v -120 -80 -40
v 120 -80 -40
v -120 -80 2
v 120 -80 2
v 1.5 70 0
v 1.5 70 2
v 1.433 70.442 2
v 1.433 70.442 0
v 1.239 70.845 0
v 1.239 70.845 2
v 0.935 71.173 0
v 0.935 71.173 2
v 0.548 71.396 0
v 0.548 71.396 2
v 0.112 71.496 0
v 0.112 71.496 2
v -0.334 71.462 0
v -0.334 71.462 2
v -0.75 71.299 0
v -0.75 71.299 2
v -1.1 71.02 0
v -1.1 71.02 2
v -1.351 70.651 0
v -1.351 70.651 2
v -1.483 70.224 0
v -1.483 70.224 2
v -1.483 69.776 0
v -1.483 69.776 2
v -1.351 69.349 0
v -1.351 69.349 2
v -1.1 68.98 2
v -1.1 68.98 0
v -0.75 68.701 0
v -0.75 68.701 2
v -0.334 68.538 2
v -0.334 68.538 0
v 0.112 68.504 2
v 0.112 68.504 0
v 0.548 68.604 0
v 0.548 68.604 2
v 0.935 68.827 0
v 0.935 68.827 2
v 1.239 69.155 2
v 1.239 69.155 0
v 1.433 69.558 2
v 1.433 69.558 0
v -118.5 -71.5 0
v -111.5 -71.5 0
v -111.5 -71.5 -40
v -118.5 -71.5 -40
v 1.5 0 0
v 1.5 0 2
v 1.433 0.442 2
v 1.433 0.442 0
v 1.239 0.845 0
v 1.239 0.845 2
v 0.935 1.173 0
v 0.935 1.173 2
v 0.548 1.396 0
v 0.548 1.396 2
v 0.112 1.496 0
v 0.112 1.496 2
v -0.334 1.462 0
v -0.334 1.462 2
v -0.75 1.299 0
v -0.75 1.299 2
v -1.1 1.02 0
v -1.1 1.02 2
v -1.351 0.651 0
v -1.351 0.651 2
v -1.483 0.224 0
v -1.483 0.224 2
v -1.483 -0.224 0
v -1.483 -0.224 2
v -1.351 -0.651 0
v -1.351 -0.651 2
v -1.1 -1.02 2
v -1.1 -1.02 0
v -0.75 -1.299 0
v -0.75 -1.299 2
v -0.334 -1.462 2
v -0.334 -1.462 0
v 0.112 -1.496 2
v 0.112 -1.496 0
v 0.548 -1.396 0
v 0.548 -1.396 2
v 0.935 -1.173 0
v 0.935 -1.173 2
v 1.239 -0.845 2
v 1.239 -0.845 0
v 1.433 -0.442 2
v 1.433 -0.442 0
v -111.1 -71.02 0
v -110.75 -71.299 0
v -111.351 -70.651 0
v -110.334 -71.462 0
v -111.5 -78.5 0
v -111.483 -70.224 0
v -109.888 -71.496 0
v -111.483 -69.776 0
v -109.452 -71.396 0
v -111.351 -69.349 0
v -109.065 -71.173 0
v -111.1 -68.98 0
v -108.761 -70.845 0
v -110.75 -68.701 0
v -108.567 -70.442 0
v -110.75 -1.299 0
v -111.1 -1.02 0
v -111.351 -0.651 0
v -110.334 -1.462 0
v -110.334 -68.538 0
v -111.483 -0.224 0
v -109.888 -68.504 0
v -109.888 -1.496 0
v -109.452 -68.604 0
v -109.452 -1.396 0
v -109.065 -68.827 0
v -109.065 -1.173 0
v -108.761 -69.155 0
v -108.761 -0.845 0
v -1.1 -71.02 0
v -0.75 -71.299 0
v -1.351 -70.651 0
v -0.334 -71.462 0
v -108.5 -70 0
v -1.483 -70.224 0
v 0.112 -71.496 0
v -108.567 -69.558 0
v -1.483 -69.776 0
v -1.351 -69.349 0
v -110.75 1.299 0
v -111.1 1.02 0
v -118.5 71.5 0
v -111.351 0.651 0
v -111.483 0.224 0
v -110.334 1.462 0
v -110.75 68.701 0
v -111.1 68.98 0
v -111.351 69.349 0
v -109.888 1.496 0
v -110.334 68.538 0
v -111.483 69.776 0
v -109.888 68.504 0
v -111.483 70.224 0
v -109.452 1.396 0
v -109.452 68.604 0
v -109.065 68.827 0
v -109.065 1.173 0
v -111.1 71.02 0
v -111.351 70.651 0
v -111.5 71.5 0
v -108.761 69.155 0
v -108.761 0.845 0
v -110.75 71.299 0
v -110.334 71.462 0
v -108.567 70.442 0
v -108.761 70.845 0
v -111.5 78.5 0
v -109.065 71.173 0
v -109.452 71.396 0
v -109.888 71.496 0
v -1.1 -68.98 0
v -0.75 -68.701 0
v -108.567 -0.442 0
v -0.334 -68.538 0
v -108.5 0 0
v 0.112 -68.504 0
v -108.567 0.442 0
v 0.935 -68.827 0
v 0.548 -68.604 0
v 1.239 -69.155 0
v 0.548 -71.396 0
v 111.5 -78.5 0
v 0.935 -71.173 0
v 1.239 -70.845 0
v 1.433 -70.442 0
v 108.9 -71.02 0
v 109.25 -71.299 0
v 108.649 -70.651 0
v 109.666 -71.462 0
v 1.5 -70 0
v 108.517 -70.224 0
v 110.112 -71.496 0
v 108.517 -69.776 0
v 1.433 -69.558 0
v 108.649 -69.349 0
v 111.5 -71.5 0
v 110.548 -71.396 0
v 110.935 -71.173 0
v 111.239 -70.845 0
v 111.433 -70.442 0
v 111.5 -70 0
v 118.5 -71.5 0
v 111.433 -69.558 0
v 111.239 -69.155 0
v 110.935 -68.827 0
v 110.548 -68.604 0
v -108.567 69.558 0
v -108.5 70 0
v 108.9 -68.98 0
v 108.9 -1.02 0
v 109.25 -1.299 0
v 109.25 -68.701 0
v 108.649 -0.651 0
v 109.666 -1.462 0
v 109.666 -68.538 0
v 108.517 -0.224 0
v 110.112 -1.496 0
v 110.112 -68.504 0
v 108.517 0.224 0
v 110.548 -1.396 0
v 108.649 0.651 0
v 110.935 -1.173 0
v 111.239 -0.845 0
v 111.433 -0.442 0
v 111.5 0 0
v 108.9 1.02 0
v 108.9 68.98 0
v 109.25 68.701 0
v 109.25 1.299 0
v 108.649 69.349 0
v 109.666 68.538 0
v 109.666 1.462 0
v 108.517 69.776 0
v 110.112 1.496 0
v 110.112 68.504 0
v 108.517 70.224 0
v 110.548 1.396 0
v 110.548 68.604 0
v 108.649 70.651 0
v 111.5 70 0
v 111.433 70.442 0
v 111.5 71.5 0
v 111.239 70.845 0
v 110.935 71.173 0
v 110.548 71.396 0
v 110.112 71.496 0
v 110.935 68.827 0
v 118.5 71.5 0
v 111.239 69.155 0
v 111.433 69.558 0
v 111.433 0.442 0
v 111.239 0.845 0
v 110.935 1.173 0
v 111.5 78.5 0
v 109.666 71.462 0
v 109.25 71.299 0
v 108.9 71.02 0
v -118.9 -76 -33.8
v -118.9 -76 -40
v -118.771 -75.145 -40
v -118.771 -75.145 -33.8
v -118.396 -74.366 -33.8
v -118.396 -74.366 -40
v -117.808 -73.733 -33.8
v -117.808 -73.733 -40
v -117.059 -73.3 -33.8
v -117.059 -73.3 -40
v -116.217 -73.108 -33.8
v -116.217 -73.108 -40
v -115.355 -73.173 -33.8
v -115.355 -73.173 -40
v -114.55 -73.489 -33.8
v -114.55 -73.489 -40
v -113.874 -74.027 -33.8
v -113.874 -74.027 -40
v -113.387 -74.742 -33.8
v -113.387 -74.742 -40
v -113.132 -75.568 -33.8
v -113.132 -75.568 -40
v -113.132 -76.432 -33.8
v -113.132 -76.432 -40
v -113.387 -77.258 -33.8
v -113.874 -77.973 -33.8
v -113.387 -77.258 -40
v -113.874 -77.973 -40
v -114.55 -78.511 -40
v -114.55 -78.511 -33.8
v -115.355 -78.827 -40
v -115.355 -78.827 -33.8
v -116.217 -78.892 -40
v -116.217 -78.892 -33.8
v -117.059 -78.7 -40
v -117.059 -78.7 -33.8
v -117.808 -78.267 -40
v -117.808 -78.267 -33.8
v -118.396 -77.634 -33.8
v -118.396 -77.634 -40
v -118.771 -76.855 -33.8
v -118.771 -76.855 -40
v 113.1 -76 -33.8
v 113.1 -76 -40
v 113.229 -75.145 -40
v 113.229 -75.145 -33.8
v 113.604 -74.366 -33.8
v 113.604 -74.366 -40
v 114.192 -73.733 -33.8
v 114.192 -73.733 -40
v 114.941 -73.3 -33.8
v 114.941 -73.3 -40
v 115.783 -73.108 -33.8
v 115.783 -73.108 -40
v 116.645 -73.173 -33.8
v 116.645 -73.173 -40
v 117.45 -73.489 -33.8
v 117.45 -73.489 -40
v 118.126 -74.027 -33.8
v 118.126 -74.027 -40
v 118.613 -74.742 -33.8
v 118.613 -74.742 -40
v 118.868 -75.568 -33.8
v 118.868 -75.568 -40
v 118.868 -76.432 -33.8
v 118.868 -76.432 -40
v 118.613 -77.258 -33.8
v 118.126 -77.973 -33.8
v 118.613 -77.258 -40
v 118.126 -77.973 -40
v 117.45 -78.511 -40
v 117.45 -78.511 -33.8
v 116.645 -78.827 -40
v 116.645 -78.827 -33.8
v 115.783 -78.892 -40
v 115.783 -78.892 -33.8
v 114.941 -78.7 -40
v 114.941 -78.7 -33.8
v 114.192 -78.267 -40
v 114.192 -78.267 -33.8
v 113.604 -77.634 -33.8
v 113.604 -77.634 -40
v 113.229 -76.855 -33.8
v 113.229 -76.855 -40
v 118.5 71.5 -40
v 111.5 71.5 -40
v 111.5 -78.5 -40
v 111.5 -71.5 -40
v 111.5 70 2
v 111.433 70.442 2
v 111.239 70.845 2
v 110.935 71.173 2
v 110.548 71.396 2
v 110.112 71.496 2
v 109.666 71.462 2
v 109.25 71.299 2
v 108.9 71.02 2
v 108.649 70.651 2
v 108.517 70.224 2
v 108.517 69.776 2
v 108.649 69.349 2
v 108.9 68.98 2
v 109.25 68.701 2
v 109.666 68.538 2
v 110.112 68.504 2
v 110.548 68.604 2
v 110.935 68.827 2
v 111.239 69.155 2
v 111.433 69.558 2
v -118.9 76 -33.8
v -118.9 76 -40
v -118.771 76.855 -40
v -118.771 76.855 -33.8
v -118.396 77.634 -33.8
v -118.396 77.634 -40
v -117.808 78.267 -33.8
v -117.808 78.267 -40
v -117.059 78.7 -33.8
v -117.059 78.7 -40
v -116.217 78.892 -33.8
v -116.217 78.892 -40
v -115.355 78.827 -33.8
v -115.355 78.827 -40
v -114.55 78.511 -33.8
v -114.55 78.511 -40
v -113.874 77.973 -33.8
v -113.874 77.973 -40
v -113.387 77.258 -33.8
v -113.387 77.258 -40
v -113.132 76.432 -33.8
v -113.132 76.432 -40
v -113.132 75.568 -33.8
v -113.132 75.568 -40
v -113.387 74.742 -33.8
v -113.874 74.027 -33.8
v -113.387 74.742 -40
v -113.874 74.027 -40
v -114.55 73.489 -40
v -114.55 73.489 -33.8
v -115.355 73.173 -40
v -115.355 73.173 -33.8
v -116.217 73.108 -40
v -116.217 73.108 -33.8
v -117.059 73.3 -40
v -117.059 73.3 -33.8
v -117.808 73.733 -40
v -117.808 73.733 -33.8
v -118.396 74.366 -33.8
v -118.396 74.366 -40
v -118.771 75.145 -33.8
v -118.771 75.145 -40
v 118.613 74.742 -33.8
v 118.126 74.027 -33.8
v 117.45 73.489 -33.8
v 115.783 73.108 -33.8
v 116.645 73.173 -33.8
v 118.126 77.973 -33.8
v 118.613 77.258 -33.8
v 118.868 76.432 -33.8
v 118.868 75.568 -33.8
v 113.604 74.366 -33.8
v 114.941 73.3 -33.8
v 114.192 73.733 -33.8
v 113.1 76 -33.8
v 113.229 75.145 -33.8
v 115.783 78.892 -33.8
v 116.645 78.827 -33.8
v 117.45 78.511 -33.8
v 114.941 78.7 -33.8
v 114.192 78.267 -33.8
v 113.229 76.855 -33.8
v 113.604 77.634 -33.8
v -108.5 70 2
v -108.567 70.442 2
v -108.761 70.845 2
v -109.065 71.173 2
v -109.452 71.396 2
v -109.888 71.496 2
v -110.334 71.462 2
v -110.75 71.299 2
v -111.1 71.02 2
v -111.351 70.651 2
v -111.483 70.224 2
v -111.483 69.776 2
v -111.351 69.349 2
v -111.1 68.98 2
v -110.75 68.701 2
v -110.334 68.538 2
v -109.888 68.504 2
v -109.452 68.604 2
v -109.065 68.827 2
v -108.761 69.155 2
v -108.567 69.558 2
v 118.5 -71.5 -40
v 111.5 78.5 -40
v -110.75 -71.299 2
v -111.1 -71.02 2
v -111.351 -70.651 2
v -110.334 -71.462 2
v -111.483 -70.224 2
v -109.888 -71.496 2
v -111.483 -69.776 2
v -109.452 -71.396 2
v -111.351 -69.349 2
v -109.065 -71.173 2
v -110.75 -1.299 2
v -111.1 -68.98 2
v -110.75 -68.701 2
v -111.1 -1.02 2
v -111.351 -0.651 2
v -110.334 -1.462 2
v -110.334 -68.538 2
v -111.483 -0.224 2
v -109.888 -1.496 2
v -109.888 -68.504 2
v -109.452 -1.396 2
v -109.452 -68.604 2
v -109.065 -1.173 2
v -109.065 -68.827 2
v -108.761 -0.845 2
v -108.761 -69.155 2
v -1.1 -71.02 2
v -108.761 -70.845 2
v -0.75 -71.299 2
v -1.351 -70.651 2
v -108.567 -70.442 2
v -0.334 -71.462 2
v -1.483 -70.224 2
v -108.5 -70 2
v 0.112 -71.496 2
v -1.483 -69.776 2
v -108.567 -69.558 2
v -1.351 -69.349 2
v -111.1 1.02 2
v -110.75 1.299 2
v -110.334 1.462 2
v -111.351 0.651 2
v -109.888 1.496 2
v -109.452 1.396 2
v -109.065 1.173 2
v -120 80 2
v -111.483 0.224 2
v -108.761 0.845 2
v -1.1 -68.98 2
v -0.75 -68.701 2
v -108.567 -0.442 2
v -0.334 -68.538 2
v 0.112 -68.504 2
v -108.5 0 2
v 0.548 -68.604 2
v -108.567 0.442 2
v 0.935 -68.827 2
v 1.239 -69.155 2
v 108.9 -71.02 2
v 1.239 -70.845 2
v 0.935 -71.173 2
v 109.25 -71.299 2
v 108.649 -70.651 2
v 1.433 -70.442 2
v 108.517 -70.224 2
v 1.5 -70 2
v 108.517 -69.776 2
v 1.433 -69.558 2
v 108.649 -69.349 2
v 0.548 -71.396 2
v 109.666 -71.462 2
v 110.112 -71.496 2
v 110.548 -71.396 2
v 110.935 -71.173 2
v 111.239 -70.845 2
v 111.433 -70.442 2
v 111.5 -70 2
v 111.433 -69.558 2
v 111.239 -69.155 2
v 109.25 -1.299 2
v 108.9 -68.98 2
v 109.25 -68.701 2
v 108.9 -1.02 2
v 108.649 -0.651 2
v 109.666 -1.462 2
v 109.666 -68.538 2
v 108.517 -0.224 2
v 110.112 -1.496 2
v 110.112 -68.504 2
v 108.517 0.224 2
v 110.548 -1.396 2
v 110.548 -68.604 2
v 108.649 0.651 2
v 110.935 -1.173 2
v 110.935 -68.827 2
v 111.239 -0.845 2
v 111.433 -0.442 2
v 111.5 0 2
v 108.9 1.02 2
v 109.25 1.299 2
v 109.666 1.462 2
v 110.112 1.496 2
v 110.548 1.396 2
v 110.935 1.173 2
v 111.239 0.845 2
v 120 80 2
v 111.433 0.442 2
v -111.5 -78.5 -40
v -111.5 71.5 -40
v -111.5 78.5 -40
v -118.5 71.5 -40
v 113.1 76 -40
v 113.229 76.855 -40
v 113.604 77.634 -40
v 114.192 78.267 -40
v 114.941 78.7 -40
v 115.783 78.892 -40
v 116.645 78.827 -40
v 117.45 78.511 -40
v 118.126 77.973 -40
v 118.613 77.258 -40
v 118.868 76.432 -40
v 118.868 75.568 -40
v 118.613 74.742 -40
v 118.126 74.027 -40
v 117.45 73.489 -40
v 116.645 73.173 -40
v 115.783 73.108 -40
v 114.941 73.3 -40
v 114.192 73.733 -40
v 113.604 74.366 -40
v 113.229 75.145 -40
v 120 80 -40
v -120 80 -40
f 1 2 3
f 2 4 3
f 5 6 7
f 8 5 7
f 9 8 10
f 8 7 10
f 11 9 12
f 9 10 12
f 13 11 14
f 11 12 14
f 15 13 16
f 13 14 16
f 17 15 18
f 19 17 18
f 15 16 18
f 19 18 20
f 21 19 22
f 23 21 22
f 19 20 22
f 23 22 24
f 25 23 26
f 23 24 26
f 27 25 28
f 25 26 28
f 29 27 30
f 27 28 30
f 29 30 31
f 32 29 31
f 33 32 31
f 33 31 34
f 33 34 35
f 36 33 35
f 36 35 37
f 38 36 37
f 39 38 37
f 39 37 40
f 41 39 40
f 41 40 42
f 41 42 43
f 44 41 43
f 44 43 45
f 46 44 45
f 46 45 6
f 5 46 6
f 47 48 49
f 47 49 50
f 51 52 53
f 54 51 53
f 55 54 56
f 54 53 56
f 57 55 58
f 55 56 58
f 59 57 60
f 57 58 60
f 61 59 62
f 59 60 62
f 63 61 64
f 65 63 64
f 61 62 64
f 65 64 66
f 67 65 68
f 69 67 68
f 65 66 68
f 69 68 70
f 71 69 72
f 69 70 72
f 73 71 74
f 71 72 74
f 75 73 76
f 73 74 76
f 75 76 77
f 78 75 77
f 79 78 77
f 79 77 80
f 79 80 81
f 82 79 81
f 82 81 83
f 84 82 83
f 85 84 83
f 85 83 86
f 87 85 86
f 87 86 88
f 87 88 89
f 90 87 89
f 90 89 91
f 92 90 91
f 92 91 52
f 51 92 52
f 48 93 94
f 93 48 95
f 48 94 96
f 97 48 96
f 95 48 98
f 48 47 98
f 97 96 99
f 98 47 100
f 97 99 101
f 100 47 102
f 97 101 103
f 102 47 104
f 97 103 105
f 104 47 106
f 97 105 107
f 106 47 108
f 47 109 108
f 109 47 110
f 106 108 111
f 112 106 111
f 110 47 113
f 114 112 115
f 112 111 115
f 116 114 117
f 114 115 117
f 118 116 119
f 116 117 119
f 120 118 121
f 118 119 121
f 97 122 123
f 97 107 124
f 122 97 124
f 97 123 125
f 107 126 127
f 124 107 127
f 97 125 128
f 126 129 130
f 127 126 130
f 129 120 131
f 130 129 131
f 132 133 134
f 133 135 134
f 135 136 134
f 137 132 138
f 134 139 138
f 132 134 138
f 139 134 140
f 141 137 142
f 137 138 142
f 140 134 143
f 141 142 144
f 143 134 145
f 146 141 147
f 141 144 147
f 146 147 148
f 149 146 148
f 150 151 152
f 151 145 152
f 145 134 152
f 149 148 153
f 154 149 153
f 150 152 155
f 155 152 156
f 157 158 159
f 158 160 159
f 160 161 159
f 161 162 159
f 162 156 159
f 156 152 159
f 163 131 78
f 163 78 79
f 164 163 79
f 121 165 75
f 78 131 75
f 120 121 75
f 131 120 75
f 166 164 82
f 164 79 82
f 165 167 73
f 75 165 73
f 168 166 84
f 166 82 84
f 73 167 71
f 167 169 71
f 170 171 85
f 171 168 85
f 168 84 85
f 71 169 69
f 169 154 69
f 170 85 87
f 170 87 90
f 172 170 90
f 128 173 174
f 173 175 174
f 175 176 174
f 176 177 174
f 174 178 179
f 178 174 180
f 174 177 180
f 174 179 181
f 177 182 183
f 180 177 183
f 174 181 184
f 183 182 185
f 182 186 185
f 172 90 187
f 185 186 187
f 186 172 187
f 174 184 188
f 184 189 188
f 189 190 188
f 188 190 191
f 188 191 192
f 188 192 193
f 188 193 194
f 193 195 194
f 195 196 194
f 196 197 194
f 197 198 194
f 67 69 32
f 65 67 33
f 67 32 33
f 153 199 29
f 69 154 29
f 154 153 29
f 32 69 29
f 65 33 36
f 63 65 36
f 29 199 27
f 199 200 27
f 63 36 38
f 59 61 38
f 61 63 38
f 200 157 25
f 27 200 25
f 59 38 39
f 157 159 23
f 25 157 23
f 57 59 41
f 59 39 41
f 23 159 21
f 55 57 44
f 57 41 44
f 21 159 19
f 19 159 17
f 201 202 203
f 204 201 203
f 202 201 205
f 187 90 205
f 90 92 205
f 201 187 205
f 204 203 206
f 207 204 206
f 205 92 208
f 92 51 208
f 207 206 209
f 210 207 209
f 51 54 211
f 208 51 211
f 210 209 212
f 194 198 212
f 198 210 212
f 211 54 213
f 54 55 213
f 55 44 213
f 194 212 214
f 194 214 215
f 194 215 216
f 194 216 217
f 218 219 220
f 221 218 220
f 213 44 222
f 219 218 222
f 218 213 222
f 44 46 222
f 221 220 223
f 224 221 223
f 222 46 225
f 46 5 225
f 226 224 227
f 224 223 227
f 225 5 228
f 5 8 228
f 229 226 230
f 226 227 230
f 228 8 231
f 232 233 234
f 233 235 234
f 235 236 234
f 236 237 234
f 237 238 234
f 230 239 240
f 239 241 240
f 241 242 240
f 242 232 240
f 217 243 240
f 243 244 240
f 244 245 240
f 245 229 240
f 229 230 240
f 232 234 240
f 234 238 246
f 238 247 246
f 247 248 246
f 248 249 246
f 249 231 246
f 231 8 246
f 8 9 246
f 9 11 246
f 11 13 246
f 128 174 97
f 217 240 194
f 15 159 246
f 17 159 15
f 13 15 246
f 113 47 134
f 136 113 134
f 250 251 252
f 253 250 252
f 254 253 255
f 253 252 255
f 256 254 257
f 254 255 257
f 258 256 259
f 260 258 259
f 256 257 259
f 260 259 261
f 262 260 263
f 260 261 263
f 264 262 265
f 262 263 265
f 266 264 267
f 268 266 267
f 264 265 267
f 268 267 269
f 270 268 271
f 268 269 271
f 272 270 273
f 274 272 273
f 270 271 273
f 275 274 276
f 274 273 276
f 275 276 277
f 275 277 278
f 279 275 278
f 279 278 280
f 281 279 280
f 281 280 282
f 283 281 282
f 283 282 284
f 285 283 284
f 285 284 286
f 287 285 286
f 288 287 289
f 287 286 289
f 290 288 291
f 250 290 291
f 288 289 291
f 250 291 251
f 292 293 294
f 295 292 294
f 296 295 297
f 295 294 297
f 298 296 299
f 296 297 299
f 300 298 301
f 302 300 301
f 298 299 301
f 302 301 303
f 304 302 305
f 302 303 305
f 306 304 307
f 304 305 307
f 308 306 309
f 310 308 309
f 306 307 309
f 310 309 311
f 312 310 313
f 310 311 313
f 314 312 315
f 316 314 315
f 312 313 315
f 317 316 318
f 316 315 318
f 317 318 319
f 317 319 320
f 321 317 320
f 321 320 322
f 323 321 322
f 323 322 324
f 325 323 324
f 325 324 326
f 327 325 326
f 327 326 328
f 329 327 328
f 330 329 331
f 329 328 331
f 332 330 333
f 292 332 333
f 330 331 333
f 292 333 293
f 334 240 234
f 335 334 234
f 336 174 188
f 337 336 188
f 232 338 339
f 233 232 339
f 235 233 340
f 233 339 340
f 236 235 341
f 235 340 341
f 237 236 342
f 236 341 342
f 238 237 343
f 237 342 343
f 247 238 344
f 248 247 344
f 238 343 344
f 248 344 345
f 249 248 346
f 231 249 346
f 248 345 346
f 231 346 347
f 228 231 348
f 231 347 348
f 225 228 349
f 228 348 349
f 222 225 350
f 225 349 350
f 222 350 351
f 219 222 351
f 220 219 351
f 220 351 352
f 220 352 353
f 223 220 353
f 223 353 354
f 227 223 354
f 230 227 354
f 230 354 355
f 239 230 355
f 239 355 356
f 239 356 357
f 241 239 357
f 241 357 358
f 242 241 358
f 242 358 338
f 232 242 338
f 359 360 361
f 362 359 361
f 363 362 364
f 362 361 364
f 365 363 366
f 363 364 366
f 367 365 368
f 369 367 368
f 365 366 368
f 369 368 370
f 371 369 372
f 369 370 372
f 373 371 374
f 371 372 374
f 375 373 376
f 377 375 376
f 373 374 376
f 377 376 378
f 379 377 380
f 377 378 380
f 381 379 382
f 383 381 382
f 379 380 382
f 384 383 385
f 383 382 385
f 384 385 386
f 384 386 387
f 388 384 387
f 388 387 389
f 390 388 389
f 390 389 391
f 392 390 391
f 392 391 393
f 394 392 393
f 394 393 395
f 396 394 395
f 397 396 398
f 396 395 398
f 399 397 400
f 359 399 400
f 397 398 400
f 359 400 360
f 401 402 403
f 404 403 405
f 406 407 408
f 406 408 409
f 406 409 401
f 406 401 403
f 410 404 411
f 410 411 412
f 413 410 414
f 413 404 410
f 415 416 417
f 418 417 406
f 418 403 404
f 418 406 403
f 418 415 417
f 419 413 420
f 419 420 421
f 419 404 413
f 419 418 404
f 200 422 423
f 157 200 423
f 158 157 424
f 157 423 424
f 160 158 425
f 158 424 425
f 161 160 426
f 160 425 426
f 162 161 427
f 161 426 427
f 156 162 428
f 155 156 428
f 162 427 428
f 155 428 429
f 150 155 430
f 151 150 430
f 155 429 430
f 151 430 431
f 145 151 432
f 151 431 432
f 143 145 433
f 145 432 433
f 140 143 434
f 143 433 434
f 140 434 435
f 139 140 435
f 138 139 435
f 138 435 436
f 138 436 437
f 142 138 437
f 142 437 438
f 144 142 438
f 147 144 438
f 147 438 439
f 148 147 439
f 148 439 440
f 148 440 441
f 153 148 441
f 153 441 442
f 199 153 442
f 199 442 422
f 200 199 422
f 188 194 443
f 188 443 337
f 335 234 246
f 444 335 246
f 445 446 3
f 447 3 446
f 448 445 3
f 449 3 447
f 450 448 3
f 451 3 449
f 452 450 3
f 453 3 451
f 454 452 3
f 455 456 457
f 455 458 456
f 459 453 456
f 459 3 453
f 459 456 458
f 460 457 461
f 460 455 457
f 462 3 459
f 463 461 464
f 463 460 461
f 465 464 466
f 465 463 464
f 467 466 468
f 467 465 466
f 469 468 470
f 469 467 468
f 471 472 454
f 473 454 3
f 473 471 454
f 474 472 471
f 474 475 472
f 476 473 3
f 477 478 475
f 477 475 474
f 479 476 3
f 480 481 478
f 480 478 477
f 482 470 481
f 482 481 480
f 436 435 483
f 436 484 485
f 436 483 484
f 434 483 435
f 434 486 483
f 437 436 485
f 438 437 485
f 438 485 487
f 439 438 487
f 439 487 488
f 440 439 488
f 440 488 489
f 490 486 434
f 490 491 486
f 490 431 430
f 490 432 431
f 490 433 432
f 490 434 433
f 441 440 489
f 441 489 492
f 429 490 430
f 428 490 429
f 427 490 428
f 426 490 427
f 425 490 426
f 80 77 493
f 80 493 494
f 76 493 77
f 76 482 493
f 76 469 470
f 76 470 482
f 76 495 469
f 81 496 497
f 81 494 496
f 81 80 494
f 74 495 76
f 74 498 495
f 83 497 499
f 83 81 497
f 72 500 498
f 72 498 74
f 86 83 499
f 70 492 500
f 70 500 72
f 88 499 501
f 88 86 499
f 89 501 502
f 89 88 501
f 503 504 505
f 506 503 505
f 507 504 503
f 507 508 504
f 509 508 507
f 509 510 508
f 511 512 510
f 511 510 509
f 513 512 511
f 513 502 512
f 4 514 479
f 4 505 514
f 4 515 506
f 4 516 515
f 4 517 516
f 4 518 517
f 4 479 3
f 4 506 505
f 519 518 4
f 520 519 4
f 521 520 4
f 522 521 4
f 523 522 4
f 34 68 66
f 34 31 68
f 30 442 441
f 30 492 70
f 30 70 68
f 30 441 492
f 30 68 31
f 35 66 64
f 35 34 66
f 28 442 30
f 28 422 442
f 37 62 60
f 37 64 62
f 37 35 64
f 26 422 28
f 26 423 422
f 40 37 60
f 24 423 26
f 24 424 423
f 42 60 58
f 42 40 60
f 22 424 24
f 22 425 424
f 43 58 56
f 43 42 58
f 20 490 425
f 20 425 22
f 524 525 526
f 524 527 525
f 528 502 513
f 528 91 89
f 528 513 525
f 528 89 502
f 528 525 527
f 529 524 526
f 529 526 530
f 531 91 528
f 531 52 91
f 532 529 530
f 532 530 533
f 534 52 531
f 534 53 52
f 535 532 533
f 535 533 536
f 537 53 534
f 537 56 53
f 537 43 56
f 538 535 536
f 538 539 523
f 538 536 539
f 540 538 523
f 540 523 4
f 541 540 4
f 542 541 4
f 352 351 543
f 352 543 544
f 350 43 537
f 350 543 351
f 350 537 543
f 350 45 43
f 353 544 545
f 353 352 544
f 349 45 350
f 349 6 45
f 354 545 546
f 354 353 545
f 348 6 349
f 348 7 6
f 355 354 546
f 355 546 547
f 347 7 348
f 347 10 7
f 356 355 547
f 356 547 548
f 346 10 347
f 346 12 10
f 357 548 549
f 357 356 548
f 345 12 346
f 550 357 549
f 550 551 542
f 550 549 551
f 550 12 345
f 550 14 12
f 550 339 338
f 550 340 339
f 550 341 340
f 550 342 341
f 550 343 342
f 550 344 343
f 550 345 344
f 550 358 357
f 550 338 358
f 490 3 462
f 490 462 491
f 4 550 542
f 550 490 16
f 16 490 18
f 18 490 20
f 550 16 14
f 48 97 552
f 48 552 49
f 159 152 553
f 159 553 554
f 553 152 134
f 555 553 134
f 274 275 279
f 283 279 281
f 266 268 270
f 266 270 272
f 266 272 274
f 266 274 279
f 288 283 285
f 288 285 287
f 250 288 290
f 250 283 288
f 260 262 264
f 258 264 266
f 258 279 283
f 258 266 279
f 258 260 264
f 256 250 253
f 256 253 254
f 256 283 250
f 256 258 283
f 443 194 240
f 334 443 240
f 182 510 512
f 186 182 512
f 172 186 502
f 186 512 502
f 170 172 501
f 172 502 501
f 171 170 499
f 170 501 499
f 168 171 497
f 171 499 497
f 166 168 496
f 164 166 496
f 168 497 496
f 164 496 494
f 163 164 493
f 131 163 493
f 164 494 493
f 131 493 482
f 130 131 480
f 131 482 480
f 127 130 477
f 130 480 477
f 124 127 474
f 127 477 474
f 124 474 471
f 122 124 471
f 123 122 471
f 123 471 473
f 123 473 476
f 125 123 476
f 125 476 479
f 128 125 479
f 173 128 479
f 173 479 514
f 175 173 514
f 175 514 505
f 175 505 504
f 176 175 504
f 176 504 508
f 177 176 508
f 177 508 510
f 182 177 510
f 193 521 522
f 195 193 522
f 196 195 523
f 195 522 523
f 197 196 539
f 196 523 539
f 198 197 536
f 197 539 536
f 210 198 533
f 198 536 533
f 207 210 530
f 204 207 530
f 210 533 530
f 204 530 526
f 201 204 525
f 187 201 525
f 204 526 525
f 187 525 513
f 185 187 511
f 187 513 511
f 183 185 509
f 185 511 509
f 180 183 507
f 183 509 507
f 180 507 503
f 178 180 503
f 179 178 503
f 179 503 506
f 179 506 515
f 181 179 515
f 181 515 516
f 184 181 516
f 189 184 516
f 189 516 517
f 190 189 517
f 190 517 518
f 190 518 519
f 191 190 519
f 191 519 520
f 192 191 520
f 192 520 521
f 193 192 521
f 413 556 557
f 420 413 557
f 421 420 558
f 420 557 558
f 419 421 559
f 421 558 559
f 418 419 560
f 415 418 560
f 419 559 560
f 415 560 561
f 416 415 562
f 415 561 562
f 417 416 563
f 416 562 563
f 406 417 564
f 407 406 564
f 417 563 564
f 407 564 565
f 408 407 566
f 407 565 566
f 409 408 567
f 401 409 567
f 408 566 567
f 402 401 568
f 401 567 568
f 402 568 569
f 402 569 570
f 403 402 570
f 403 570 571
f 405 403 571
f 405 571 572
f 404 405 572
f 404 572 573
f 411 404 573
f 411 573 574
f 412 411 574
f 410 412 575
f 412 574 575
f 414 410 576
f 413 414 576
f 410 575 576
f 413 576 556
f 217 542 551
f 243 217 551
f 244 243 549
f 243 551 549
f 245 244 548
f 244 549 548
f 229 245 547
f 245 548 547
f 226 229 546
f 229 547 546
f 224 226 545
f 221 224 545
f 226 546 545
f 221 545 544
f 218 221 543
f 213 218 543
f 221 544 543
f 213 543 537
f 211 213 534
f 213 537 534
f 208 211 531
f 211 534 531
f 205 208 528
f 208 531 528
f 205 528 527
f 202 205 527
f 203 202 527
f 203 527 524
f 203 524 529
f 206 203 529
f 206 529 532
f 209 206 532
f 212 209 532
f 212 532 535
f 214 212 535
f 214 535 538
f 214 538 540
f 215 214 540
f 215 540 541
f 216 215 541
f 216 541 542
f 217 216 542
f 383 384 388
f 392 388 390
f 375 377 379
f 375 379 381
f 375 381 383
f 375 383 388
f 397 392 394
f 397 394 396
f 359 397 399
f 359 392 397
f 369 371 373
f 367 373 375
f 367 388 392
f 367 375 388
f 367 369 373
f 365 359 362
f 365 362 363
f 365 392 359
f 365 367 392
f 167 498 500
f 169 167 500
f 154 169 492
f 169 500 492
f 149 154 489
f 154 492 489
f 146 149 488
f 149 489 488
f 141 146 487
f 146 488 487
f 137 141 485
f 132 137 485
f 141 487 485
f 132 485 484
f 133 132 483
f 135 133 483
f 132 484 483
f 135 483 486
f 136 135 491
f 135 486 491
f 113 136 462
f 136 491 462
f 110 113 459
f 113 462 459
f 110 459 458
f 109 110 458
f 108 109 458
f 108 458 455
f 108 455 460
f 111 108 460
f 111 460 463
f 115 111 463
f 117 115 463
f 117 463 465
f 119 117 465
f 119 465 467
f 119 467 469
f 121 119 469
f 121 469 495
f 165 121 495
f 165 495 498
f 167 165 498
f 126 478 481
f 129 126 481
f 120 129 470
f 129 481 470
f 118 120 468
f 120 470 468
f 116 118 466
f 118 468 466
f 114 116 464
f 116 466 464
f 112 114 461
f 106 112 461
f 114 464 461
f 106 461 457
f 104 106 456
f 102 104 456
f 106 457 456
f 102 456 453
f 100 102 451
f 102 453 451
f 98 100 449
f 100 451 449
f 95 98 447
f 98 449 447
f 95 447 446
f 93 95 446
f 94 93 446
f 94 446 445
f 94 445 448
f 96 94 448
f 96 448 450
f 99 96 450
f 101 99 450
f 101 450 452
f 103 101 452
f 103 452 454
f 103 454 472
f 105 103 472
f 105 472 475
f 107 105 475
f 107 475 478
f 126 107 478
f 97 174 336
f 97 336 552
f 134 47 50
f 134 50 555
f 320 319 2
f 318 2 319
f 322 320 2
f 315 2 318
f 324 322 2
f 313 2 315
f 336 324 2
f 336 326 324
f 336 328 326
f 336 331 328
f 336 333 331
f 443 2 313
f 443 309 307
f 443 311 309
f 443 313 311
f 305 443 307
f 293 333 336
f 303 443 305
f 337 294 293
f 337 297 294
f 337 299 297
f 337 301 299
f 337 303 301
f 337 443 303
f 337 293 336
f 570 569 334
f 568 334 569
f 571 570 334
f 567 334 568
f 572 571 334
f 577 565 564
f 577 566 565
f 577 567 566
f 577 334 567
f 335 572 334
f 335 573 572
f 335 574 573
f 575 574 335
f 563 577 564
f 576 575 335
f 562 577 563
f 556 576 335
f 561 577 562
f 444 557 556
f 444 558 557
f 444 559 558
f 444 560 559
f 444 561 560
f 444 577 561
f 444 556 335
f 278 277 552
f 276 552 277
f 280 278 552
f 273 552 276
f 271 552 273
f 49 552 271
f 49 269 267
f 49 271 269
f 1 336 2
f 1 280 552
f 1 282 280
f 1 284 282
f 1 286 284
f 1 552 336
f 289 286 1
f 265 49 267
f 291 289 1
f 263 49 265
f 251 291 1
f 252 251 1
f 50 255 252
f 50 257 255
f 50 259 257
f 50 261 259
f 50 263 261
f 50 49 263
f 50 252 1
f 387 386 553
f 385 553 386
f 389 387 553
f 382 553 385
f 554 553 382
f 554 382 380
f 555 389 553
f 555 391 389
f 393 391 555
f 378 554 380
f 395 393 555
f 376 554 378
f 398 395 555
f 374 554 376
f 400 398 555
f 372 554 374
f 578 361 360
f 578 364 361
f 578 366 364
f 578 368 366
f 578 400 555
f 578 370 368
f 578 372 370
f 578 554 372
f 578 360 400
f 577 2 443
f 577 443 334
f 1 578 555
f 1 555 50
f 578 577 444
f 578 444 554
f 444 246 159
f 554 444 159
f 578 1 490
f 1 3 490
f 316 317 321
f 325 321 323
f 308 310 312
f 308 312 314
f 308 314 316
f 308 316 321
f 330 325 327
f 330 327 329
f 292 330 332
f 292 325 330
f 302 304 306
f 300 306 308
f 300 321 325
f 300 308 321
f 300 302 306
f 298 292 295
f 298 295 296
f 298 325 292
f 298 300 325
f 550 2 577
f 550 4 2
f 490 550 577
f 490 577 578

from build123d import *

# Parameters (mm, degrees)
SKETCH1_W           = 240
SKETCH1_H           = 160
BOSS_EXTRUDE1_DEPTH = 2
SKETCH5_R           = 1.5
CUT_EXTRUDE2_DEPTH  = 4
SKETCH6_W           = 240
SKETCH6_H           = 160
SKETCH6_W_2         = 237
SKETCH6_H_2         = 157
BOSS_EXTRUDE2_DEPTH = 40
SKETCH7_W           = 7
SKETCH7_H           = 7
BOSS_EXTRUDE3_DEPTH = 40
SKETCH8_R           = 2.9
CUT_EXTRUDE3_DEPTH  = 6.2


with BuildPart() as part:
    # Sketch1 → Boss-Extrude1 (new body)
    with BuildSketch(Plane.XY):
        Rectangle(SKETCH1_W, SKETCH1_H)
    extrude(amount=BOSS_EXTRUDE1_DEPTH)

    # Sketch5 → Cut-Extrude2 (cut)
    with BuildSketch(Plane.XY.offset(2)):
        with Locations((-110, 70)):
            Circle(SKETCH5_R)
        with Locations((0, 70)):
            Circle(SKETCH5_R)
        with Locations((110, 70)):
            Circle(SKETCH5_R)
        Circle(SKETCH5_R)
        with Locations((110, 0)):
            Circle(SKETCH5_R)
        with Locations((0, -70)):
            Circle(SKETCH5_R)
        with Locations((110, -70)):
            Circle(SKETCH5_R)
        with Locations((-110, 0)):
            Circle(SKETCH5_R)
        with Locations((-110, -70)):
            Circle(SKETCH5_R)
    extrude(amount=-CUT_EXTRUDE2_DEPTH, mode=Mode.SUBTRACT)

    # Sketch6 → Boss-Extrude2 (add)
    with BuildSketch(Plane(origin=(0, 0, 0), x_dir=(-1, 0, 0), z_dir=(0, 0, -1))):
        Rectangle(SKETCH6_W, SKETCH6_H)
        Rectangle(SKETCH6_W_2, SKETCH6_H_2, mode=Mode.SUBTRACT)
    extrude(amount=BOSS_EXTRUDE2_DEPTH)

    # Sketch7 → Boss-Extrude3 (add)
    with BuildSketch(Plane(origin=(0, 0, 0), x_dir=(-1, 0, 0), z_dir=(0, 0, -1))):
        with Locations((115, -75)):
            Rectangle(SKETCH7_W, SKETCH7_H)
        with Locations((115, 75)):
            Rectangle(SKETCH7_W, SKETCH7_H)
        with Locations((-115, 75)):
            Rectangle(SKETCH7_W, SKETCH7_H)
        with Locations((-115, -75)):
            Rectangle(SKETCH7_W, SKETCH7_H)
    extrude(amount=BOSS_EXTRUDE3_DEPTH)

    # Sketch8 → Cut-Extrude3 (cut)
    with BuildSketch(Plane(origin=(0, 0, -40), x_dir=(-1, 0, 0), z_dir=(0, 0, -1))):
        with Locations((116, -76)):
            Circle(SKETCH8_R)
        with Locations((116, 76)):
            Circle(SKETCH8_R)
        with Locations((-116, 76)):
            Circle(SKETCH8_R)
        with Locations((-116, -76)):
            Circle(SKETCH8_R)
    extrude(amount=-CUT_EXTRUDE3_DEPTH, mode=Mode.SUBTRACT)


solid = part.part
